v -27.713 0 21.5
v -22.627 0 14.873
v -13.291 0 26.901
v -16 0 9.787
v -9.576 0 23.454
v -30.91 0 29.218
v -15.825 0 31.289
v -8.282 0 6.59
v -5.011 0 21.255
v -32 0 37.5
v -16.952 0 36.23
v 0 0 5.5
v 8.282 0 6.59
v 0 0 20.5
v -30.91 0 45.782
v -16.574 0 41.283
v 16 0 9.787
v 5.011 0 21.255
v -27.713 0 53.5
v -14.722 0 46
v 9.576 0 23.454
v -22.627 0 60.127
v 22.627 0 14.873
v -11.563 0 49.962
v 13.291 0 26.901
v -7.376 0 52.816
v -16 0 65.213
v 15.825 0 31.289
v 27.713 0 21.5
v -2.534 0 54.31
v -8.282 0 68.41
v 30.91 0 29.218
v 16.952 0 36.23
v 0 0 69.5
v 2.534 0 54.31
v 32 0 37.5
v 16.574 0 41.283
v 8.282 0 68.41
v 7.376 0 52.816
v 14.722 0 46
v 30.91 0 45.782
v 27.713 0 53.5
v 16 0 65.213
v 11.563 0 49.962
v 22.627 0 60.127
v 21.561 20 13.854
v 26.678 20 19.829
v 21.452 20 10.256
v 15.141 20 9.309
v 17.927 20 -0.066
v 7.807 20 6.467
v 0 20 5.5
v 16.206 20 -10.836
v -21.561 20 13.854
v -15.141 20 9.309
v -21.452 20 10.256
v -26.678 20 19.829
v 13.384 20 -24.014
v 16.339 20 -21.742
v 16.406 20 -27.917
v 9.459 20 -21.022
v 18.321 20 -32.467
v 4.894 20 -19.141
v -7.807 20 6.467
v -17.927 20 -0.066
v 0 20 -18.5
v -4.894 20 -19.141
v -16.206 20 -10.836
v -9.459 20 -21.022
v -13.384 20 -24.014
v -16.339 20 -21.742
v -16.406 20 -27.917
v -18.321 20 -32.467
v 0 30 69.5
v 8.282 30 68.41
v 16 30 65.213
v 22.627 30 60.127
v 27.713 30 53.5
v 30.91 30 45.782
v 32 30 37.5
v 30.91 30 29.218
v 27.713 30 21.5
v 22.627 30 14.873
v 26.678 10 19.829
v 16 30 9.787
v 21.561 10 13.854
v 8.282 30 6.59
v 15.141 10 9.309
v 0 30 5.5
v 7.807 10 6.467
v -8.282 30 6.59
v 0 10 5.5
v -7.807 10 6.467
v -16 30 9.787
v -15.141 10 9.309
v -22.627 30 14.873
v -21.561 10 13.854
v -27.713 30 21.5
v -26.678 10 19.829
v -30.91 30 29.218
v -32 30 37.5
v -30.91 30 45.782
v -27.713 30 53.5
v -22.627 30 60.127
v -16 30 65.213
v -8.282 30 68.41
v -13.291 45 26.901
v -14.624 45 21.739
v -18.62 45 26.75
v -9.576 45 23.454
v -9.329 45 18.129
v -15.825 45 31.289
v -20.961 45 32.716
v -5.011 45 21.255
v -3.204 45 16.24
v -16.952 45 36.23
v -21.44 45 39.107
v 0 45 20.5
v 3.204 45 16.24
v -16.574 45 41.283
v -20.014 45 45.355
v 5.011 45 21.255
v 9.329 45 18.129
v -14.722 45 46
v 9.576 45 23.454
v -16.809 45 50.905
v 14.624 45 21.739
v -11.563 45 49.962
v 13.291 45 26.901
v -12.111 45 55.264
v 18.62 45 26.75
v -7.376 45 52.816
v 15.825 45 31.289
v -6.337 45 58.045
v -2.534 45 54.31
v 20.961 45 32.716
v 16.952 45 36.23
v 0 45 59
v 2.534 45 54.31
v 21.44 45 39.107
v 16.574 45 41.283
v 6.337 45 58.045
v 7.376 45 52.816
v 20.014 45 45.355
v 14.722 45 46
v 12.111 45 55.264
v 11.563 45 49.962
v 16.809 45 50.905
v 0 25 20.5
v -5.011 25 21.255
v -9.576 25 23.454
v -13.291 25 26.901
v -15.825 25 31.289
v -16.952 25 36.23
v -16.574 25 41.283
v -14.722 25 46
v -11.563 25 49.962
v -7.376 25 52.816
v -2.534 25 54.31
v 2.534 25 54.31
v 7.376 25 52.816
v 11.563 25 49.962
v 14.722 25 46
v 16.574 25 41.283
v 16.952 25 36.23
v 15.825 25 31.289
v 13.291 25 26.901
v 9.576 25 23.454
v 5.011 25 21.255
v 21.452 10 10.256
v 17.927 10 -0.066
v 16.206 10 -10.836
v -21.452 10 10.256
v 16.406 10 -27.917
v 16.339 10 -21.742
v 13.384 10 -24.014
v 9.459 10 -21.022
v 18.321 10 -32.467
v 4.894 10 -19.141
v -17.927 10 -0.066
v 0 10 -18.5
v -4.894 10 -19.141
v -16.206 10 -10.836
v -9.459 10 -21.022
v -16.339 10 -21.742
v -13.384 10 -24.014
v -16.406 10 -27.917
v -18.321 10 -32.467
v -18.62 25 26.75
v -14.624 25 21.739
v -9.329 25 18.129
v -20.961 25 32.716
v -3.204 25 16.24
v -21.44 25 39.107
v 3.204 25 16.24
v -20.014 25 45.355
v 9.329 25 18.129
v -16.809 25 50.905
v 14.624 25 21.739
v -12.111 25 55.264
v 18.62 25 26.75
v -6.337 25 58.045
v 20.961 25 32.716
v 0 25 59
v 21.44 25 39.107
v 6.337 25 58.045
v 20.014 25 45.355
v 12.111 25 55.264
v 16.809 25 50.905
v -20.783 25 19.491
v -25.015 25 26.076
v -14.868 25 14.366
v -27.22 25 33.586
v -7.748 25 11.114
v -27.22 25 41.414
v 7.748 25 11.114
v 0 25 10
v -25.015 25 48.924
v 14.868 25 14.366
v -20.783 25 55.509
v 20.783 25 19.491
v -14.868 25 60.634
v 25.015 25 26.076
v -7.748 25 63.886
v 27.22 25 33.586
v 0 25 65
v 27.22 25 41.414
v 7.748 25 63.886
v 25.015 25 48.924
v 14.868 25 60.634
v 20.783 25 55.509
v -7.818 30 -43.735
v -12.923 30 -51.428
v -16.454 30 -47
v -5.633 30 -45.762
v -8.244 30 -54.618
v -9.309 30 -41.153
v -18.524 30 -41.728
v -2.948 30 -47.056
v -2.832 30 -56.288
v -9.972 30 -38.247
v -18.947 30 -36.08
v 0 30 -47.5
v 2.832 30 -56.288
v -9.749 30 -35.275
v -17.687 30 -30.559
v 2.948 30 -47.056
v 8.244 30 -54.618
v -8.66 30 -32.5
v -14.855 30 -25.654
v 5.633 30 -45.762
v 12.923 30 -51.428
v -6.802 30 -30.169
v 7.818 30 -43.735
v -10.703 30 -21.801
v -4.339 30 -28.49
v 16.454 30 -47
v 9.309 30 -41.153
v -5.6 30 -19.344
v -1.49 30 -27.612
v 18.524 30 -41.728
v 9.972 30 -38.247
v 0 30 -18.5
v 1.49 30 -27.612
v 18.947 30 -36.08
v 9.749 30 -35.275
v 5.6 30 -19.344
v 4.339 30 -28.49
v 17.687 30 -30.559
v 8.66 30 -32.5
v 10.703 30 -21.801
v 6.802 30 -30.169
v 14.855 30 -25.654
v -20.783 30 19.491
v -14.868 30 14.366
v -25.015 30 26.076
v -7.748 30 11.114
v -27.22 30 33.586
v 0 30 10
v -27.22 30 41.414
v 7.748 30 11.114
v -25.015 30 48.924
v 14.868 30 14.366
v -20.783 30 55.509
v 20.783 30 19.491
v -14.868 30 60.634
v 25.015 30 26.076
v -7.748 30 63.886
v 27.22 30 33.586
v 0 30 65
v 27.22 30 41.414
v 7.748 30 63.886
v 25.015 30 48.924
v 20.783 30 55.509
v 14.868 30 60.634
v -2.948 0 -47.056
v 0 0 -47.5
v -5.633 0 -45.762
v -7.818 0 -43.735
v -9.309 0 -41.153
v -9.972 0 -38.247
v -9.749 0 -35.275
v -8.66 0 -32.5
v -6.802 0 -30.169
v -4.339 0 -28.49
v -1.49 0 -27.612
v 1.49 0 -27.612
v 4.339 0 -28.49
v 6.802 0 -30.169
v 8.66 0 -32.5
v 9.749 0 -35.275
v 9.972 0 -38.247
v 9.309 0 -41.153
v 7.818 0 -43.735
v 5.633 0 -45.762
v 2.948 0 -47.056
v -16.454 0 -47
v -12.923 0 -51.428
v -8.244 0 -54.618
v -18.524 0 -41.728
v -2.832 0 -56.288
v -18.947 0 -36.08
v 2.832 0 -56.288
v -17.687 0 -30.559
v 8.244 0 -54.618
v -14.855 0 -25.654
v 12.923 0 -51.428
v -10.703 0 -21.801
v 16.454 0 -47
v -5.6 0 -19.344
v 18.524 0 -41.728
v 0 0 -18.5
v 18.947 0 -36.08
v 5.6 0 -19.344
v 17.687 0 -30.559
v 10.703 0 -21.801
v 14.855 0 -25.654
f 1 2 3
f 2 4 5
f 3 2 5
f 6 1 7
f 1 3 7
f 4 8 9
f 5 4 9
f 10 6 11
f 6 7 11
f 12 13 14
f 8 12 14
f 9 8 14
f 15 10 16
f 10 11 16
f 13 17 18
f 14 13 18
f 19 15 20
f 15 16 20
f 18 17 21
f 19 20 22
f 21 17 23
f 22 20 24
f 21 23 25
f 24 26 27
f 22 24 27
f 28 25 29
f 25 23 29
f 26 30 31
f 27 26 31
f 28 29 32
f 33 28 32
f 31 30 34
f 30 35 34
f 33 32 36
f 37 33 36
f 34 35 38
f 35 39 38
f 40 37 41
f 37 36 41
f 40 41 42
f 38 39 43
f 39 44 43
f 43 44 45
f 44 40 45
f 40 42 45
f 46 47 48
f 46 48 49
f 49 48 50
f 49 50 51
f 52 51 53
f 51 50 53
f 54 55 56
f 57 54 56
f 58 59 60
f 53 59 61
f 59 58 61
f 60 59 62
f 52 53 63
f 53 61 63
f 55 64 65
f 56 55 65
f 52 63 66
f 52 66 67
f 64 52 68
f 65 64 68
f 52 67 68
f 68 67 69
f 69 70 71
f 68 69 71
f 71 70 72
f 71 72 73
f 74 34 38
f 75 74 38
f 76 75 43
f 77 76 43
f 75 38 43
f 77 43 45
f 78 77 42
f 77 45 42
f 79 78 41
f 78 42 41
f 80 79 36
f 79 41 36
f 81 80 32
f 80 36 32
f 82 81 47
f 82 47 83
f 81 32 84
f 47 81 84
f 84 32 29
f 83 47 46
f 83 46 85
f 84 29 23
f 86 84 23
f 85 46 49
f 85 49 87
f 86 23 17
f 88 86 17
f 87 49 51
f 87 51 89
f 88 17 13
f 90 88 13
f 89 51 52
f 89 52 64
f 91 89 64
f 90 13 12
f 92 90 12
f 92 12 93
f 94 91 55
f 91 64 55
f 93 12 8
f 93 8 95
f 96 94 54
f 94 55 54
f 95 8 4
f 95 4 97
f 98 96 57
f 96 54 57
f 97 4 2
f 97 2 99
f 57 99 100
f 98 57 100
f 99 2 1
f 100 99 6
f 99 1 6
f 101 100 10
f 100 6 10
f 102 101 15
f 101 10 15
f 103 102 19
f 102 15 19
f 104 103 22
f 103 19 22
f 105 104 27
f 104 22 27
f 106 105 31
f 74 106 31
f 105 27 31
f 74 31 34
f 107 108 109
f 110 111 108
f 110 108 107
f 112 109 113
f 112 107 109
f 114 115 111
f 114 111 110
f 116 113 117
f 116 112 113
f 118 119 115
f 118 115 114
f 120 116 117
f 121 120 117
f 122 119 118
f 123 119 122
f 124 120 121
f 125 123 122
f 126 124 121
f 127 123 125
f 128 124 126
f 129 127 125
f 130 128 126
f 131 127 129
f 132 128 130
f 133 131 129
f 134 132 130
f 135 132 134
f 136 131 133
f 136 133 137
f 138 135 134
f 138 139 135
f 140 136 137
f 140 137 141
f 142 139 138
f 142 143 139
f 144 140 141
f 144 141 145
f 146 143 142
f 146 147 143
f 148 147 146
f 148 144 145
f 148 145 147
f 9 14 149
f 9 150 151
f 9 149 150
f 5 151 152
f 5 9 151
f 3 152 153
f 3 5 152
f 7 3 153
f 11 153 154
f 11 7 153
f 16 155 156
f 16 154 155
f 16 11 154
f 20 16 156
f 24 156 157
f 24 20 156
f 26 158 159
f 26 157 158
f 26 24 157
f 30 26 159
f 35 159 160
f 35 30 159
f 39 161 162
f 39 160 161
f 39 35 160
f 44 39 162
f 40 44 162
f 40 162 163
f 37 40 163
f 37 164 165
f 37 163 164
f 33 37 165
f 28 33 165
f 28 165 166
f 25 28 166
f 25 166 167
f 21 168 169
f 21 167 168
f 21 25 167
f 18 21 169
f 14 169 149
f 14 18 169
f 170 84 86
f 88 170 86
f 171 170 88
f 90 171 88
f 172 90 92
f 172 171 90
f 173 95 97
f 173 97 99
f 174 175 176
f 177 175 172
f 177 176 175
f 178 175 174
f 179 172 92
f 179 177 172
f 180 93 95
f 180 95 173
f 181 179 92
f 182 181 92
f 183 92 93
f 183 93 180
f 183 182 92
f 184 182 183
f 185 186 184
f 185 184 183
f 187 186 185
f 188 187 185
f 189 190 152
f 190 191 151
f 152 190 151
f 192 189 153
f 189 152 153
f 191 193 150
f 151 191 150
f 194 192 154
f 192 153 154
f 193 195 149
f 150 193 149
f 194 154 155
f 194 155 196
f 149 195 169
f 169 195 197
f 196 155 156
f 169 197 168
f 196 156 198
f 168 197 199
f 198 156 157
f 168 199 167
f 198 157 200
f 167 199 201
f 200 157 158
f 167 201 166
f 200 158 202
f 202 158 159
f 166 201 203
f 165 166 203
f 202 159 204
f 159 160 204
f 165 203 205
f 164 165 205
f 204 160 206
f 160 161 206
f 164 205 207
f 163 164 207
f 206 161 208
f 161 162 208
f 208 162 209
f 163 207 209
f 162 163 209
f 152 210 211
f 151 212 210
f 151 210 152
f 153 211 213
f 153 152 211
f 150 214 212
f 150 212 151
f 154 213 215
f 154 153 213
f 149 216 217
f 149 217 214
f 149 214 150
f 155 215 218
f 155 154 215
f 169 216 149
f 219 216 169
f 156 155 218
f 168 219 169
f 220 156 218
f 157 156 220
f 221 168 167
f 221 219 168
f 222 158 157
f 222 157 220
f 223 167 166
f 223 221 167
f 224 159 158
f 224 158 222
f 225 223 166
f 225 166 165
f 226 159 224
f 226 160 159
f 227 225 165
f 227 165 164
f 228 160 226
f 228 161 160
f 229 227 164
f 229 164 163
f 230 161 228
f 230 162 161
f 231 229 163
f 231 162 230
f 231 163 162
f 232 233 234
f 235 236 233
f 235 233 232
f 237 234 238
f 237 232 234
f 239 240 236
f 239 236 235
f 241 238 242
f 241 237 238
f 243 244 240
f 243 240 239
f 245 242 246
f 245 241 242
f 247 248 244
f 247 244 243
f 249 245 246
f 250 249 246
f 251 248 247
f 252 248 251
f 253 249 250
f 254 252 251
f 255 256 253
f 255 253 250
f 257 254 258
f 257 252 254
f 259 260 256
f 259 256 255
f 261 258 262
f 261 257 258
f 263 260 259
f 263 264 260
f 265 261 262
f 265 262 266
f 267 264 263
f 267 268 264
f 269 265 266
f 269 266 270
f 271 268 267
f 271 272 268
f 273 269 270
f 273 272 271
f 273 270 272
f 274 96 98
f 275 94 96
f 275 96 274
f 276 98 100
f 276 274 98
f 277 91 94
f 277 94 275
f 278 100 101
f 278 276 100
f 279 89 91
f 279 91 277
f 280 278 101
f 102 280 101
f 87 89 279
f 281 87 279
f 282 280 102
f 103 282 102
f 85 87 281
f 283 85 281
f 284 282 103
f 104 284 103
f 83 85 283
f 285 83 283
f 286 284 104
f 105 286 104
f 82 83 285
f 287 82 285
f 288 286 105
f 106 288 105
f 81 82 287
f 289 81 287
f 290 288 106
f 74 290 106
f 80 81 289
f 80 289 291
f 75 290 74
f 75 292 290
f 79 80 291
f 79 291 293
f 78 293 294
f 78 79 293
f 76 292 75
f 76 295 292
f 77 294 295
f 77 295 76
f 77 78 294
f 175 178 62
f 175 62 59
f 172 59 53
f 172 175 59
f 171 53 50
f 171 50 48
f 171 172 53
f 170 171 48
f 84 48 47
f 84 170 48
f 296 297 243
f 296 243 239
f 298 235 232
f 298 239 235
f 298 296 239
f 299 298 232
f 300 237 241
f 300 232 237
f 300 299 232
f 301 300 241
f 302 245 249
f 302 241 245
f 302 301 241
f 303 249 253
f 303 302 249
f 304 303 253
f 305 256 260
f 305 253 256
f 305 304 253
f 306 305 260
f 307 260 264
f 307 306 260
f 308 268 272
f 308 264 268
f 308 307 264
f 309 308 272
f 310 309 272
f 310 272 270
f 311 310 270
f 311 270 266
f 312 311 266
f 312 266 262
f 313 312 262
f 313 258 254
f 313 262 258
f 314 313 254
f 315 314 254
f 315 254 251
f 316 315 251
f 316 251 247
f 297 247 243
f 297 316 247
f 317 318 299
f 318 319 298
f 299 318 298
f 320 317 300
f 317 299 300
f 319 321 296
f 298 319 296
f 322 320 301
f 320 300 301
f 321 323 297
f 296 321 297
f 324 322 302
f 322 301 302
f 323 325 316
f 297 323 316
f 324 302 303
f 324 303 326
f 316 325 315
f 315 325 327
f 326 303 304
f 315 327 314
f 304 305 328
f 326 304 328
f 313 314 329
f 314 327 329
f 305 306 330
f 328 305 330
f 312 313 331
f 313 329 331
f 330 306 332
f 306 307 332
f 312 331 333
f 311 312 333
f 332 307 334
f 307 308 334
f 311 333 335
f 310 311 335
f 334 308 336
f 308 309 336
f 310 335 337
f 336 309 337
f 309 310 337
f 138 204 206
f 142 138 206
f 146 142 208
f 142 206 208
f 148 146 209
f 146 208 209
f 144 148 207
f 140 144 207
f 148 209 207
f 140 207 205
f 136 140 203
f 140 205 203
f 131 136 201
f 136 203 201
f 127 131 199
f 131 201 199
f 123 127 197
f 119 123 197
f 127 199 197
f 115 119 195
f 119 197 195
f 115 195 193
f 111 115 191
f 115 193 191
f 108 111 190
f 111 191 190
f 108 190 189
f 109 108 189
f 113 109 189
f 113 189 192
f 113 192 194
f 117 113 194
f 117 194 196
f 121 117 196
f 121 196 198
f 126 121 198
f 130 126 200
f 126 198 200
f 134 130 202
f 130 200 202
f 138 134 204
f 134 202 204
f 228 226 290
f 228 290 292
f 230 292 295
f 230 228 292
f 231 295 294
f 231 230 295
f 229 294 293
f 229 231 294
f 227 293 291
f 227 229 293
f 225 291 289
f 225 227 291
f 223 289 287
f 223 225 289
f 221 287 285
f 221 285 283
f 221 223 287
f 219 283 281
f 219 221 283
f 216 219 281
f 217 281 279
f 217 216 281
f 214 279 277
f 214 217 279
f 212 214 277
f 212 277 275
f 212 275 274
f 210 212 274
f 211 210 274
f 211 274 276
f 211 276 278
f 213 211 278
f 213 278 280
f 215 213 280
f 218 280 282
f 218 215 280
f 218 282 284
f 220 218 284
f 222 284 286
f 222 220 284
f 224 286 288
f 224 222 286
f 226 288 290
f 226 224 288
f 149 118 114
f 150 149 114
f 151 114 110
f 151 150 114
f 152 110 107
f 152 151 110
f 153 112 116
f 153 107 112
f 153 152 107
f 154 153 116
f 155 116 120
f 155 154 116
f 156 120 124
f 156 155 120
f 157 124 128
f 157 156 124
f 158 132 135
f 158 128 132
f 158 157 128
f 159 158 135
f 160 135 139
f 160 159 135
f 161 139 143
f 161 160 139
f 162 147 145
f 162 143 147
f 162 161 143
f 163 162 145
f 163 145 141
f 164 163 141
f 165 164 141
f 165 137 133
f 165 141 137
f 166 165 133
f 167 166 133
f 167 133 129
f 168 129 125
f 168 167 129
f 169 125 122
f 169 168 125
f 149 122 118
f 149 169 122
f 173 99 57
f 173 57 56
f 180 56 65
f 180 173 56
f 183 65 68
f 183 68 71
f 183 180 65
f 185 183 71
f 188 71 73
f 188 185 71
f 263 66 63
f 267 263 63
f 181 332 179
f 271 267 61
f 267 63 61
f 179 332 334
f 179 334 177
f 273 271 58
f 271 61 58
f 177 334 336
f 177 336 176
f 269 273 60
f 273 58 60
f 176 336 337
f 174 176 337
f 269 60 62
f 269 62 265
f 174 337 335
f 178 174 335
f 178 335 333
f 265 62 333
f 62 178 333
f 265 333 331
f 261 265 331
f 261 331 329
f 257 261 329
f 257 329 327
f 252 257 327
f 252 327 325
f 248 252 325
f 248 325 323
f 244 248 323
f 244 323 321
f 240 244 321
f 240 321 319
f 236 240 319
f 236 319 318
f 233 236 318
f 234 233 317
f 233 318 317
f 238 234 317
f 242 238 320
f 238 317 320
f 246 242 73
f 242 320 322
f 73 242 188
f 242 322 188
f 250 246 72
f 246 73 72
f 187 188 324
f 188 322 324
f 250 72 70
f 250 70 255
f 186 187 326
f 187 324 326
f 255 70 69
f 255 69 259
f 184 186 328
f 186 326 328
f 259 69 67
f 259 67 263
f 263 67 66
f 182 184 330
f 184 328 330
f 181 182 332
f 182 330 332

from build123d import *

# Parameters (mm, degrees)
SKETCH2_R               = 19
BOSS_EXTRUDE1_DEPTH     = 30
SKETCH2_R_2             = 32
BOSS_EXTRUDE1_2_DEPTH   = 30
BOSS_EXTRUDE2_DEPTH     = 10
SKETCH4_R               = 27.5
CUT_EXTRUDE1_DEPTH      = 5
SKETCH5_R               = 21.5
BOSS_EXTRUDE3_DEPTH     = 20
CUT_EXTRUDE3_DEPTH      = 89.765139554
CUT_EXTRUDE3_DEPTH_BACK = 89.765139554
SKETCH6_R               = 10
SKETCH6_R_2             = 17


with BuildPart() as part:
    # Sketch2 → Boss-Extrude1 (new body)
    with BuildSketch(Plane(origin=(0, 0, 0), x_dir=(1, 0, 0), z_dir=(0, 1, 0))):
        with Locations(Location((0, 37.5, 0), (0, 0, 270))):
            Circle(SKETCH2_R)
    extrude(amount=BOSS_EXTRUDE1_DEPTH)



with BuildPart() as body_2:
    # Sketch2 → Boss-Extrude1 2 (new body)
    with BuildSketch(Plane(origin=(0, 0, 0), x_dir=(1, 0, 0), z_dir=(0, 1, 0))):
        with Locations(Location((0, -37.5, 0), (0, 0, 270))):
            Circle(SKETCH2_R_2)
    extrude(amount=BOSS_EXTRUDE1_2_DEPTH)


with BuildPart() as part_1:
    add(part.part)

    add(body_2.part)  # Boss-Extrude2 merges body 2
    # Sketch3 → Boss-Extrude2 (add)
    with BuildSketch(Plane(origin=(0, 10, 0), x_dir=(1, 0, 0), z_dir=(0, 1, 0))):
        with BuildLine():
            ThreePointArc((-18.321243986, 32.466907631), (0, 18.5), (18.321243986, 32.466907631))
            ThreePointArc((18.321243986, 32.466907631), (16.836772686, 5.414041255), (26.678302647, -19.828888889))
            ThreePointArc((26.678302647, -19.828888889), (0, -5.5), (-26.678302647, -19.828888889))
            ThreePointArc((-26.678302647, -19.828888889), (-16.836772686, 5.414041255), (-18.321243986, 32.466907631))
        make_face()
    extrude(amount=BOSS_EXTRUDE2_DEPTH)

    # Sketch4 → Cut-Extrude1 (cut)
    with BuildSketch(Plane(origin=(0, 25, 0), x_dir=(1, 0, 0), z_dir=(0, 1, 0))):
        with Locations(Location((0, -37.5, 0), (0, 0, 270))):
            Circle(SKETCH4_R)
    extrude(amount=CUT_EXTRUDE1_DEPTH, mode=Mode.SUBTRACT)


with BuildPart() as body_2_2:
    # Sketch5 → Boss-Extrude3 (new body)
    with BuildSketch(Plane(origin=(0, 25, 0), x_dir=(1, 0, 0), z_dir=(0, 1, 0))):
        with Locations(Location((0, -37.5, 0), (0, 0, 270))):
            Circle(SKETCH5_R)
    extrude(amount=BOSS_EXTRUDE3_DEPTH)


with BuildPart() as cut_extrude3_tool:
    # Sketch6 → Cut-Extrude3 (new, two sides: drawn at the far end of the back side and taken through both)
    with BuildSketch(Plane(origin=(0, 0, 0), x_dir=(1, 0, 0), z_dir=(0, 1, 0)).offset(-CUT_EXTRUDE3_DEPTH_BACK)):
        with Locations(Location((0, 37.5, 0), (0, 0, 90))):
            Circle(SKETCH6_R)
        with Locations(Location((0, -37.5, 0), (0, 0, 90))):
            Circle(SKETCH6_R_2)
    extrude(amount=CUT_EXTRUDE3_DEPTH + CUT_EXTRUDE3_DEPTH_BACK)


with BuildPart() as part_2:
    add(part_1.part)

    # Cut-Extrude3: cut by cut_extrude3_tool
    add(cut_extrude3_tool.part, mode=Mode.SUBTRACT)


with BuildPart() as body_2_2_1:
    add(body_2_2.part)

    # Cut-Extrude3: cut by cut_extrude3_tool
    add(cut_extrude3_tool.part, mode=Mode.SUBTRACT)


solid = Compound([part_2.part, body_2_2_1.part])
